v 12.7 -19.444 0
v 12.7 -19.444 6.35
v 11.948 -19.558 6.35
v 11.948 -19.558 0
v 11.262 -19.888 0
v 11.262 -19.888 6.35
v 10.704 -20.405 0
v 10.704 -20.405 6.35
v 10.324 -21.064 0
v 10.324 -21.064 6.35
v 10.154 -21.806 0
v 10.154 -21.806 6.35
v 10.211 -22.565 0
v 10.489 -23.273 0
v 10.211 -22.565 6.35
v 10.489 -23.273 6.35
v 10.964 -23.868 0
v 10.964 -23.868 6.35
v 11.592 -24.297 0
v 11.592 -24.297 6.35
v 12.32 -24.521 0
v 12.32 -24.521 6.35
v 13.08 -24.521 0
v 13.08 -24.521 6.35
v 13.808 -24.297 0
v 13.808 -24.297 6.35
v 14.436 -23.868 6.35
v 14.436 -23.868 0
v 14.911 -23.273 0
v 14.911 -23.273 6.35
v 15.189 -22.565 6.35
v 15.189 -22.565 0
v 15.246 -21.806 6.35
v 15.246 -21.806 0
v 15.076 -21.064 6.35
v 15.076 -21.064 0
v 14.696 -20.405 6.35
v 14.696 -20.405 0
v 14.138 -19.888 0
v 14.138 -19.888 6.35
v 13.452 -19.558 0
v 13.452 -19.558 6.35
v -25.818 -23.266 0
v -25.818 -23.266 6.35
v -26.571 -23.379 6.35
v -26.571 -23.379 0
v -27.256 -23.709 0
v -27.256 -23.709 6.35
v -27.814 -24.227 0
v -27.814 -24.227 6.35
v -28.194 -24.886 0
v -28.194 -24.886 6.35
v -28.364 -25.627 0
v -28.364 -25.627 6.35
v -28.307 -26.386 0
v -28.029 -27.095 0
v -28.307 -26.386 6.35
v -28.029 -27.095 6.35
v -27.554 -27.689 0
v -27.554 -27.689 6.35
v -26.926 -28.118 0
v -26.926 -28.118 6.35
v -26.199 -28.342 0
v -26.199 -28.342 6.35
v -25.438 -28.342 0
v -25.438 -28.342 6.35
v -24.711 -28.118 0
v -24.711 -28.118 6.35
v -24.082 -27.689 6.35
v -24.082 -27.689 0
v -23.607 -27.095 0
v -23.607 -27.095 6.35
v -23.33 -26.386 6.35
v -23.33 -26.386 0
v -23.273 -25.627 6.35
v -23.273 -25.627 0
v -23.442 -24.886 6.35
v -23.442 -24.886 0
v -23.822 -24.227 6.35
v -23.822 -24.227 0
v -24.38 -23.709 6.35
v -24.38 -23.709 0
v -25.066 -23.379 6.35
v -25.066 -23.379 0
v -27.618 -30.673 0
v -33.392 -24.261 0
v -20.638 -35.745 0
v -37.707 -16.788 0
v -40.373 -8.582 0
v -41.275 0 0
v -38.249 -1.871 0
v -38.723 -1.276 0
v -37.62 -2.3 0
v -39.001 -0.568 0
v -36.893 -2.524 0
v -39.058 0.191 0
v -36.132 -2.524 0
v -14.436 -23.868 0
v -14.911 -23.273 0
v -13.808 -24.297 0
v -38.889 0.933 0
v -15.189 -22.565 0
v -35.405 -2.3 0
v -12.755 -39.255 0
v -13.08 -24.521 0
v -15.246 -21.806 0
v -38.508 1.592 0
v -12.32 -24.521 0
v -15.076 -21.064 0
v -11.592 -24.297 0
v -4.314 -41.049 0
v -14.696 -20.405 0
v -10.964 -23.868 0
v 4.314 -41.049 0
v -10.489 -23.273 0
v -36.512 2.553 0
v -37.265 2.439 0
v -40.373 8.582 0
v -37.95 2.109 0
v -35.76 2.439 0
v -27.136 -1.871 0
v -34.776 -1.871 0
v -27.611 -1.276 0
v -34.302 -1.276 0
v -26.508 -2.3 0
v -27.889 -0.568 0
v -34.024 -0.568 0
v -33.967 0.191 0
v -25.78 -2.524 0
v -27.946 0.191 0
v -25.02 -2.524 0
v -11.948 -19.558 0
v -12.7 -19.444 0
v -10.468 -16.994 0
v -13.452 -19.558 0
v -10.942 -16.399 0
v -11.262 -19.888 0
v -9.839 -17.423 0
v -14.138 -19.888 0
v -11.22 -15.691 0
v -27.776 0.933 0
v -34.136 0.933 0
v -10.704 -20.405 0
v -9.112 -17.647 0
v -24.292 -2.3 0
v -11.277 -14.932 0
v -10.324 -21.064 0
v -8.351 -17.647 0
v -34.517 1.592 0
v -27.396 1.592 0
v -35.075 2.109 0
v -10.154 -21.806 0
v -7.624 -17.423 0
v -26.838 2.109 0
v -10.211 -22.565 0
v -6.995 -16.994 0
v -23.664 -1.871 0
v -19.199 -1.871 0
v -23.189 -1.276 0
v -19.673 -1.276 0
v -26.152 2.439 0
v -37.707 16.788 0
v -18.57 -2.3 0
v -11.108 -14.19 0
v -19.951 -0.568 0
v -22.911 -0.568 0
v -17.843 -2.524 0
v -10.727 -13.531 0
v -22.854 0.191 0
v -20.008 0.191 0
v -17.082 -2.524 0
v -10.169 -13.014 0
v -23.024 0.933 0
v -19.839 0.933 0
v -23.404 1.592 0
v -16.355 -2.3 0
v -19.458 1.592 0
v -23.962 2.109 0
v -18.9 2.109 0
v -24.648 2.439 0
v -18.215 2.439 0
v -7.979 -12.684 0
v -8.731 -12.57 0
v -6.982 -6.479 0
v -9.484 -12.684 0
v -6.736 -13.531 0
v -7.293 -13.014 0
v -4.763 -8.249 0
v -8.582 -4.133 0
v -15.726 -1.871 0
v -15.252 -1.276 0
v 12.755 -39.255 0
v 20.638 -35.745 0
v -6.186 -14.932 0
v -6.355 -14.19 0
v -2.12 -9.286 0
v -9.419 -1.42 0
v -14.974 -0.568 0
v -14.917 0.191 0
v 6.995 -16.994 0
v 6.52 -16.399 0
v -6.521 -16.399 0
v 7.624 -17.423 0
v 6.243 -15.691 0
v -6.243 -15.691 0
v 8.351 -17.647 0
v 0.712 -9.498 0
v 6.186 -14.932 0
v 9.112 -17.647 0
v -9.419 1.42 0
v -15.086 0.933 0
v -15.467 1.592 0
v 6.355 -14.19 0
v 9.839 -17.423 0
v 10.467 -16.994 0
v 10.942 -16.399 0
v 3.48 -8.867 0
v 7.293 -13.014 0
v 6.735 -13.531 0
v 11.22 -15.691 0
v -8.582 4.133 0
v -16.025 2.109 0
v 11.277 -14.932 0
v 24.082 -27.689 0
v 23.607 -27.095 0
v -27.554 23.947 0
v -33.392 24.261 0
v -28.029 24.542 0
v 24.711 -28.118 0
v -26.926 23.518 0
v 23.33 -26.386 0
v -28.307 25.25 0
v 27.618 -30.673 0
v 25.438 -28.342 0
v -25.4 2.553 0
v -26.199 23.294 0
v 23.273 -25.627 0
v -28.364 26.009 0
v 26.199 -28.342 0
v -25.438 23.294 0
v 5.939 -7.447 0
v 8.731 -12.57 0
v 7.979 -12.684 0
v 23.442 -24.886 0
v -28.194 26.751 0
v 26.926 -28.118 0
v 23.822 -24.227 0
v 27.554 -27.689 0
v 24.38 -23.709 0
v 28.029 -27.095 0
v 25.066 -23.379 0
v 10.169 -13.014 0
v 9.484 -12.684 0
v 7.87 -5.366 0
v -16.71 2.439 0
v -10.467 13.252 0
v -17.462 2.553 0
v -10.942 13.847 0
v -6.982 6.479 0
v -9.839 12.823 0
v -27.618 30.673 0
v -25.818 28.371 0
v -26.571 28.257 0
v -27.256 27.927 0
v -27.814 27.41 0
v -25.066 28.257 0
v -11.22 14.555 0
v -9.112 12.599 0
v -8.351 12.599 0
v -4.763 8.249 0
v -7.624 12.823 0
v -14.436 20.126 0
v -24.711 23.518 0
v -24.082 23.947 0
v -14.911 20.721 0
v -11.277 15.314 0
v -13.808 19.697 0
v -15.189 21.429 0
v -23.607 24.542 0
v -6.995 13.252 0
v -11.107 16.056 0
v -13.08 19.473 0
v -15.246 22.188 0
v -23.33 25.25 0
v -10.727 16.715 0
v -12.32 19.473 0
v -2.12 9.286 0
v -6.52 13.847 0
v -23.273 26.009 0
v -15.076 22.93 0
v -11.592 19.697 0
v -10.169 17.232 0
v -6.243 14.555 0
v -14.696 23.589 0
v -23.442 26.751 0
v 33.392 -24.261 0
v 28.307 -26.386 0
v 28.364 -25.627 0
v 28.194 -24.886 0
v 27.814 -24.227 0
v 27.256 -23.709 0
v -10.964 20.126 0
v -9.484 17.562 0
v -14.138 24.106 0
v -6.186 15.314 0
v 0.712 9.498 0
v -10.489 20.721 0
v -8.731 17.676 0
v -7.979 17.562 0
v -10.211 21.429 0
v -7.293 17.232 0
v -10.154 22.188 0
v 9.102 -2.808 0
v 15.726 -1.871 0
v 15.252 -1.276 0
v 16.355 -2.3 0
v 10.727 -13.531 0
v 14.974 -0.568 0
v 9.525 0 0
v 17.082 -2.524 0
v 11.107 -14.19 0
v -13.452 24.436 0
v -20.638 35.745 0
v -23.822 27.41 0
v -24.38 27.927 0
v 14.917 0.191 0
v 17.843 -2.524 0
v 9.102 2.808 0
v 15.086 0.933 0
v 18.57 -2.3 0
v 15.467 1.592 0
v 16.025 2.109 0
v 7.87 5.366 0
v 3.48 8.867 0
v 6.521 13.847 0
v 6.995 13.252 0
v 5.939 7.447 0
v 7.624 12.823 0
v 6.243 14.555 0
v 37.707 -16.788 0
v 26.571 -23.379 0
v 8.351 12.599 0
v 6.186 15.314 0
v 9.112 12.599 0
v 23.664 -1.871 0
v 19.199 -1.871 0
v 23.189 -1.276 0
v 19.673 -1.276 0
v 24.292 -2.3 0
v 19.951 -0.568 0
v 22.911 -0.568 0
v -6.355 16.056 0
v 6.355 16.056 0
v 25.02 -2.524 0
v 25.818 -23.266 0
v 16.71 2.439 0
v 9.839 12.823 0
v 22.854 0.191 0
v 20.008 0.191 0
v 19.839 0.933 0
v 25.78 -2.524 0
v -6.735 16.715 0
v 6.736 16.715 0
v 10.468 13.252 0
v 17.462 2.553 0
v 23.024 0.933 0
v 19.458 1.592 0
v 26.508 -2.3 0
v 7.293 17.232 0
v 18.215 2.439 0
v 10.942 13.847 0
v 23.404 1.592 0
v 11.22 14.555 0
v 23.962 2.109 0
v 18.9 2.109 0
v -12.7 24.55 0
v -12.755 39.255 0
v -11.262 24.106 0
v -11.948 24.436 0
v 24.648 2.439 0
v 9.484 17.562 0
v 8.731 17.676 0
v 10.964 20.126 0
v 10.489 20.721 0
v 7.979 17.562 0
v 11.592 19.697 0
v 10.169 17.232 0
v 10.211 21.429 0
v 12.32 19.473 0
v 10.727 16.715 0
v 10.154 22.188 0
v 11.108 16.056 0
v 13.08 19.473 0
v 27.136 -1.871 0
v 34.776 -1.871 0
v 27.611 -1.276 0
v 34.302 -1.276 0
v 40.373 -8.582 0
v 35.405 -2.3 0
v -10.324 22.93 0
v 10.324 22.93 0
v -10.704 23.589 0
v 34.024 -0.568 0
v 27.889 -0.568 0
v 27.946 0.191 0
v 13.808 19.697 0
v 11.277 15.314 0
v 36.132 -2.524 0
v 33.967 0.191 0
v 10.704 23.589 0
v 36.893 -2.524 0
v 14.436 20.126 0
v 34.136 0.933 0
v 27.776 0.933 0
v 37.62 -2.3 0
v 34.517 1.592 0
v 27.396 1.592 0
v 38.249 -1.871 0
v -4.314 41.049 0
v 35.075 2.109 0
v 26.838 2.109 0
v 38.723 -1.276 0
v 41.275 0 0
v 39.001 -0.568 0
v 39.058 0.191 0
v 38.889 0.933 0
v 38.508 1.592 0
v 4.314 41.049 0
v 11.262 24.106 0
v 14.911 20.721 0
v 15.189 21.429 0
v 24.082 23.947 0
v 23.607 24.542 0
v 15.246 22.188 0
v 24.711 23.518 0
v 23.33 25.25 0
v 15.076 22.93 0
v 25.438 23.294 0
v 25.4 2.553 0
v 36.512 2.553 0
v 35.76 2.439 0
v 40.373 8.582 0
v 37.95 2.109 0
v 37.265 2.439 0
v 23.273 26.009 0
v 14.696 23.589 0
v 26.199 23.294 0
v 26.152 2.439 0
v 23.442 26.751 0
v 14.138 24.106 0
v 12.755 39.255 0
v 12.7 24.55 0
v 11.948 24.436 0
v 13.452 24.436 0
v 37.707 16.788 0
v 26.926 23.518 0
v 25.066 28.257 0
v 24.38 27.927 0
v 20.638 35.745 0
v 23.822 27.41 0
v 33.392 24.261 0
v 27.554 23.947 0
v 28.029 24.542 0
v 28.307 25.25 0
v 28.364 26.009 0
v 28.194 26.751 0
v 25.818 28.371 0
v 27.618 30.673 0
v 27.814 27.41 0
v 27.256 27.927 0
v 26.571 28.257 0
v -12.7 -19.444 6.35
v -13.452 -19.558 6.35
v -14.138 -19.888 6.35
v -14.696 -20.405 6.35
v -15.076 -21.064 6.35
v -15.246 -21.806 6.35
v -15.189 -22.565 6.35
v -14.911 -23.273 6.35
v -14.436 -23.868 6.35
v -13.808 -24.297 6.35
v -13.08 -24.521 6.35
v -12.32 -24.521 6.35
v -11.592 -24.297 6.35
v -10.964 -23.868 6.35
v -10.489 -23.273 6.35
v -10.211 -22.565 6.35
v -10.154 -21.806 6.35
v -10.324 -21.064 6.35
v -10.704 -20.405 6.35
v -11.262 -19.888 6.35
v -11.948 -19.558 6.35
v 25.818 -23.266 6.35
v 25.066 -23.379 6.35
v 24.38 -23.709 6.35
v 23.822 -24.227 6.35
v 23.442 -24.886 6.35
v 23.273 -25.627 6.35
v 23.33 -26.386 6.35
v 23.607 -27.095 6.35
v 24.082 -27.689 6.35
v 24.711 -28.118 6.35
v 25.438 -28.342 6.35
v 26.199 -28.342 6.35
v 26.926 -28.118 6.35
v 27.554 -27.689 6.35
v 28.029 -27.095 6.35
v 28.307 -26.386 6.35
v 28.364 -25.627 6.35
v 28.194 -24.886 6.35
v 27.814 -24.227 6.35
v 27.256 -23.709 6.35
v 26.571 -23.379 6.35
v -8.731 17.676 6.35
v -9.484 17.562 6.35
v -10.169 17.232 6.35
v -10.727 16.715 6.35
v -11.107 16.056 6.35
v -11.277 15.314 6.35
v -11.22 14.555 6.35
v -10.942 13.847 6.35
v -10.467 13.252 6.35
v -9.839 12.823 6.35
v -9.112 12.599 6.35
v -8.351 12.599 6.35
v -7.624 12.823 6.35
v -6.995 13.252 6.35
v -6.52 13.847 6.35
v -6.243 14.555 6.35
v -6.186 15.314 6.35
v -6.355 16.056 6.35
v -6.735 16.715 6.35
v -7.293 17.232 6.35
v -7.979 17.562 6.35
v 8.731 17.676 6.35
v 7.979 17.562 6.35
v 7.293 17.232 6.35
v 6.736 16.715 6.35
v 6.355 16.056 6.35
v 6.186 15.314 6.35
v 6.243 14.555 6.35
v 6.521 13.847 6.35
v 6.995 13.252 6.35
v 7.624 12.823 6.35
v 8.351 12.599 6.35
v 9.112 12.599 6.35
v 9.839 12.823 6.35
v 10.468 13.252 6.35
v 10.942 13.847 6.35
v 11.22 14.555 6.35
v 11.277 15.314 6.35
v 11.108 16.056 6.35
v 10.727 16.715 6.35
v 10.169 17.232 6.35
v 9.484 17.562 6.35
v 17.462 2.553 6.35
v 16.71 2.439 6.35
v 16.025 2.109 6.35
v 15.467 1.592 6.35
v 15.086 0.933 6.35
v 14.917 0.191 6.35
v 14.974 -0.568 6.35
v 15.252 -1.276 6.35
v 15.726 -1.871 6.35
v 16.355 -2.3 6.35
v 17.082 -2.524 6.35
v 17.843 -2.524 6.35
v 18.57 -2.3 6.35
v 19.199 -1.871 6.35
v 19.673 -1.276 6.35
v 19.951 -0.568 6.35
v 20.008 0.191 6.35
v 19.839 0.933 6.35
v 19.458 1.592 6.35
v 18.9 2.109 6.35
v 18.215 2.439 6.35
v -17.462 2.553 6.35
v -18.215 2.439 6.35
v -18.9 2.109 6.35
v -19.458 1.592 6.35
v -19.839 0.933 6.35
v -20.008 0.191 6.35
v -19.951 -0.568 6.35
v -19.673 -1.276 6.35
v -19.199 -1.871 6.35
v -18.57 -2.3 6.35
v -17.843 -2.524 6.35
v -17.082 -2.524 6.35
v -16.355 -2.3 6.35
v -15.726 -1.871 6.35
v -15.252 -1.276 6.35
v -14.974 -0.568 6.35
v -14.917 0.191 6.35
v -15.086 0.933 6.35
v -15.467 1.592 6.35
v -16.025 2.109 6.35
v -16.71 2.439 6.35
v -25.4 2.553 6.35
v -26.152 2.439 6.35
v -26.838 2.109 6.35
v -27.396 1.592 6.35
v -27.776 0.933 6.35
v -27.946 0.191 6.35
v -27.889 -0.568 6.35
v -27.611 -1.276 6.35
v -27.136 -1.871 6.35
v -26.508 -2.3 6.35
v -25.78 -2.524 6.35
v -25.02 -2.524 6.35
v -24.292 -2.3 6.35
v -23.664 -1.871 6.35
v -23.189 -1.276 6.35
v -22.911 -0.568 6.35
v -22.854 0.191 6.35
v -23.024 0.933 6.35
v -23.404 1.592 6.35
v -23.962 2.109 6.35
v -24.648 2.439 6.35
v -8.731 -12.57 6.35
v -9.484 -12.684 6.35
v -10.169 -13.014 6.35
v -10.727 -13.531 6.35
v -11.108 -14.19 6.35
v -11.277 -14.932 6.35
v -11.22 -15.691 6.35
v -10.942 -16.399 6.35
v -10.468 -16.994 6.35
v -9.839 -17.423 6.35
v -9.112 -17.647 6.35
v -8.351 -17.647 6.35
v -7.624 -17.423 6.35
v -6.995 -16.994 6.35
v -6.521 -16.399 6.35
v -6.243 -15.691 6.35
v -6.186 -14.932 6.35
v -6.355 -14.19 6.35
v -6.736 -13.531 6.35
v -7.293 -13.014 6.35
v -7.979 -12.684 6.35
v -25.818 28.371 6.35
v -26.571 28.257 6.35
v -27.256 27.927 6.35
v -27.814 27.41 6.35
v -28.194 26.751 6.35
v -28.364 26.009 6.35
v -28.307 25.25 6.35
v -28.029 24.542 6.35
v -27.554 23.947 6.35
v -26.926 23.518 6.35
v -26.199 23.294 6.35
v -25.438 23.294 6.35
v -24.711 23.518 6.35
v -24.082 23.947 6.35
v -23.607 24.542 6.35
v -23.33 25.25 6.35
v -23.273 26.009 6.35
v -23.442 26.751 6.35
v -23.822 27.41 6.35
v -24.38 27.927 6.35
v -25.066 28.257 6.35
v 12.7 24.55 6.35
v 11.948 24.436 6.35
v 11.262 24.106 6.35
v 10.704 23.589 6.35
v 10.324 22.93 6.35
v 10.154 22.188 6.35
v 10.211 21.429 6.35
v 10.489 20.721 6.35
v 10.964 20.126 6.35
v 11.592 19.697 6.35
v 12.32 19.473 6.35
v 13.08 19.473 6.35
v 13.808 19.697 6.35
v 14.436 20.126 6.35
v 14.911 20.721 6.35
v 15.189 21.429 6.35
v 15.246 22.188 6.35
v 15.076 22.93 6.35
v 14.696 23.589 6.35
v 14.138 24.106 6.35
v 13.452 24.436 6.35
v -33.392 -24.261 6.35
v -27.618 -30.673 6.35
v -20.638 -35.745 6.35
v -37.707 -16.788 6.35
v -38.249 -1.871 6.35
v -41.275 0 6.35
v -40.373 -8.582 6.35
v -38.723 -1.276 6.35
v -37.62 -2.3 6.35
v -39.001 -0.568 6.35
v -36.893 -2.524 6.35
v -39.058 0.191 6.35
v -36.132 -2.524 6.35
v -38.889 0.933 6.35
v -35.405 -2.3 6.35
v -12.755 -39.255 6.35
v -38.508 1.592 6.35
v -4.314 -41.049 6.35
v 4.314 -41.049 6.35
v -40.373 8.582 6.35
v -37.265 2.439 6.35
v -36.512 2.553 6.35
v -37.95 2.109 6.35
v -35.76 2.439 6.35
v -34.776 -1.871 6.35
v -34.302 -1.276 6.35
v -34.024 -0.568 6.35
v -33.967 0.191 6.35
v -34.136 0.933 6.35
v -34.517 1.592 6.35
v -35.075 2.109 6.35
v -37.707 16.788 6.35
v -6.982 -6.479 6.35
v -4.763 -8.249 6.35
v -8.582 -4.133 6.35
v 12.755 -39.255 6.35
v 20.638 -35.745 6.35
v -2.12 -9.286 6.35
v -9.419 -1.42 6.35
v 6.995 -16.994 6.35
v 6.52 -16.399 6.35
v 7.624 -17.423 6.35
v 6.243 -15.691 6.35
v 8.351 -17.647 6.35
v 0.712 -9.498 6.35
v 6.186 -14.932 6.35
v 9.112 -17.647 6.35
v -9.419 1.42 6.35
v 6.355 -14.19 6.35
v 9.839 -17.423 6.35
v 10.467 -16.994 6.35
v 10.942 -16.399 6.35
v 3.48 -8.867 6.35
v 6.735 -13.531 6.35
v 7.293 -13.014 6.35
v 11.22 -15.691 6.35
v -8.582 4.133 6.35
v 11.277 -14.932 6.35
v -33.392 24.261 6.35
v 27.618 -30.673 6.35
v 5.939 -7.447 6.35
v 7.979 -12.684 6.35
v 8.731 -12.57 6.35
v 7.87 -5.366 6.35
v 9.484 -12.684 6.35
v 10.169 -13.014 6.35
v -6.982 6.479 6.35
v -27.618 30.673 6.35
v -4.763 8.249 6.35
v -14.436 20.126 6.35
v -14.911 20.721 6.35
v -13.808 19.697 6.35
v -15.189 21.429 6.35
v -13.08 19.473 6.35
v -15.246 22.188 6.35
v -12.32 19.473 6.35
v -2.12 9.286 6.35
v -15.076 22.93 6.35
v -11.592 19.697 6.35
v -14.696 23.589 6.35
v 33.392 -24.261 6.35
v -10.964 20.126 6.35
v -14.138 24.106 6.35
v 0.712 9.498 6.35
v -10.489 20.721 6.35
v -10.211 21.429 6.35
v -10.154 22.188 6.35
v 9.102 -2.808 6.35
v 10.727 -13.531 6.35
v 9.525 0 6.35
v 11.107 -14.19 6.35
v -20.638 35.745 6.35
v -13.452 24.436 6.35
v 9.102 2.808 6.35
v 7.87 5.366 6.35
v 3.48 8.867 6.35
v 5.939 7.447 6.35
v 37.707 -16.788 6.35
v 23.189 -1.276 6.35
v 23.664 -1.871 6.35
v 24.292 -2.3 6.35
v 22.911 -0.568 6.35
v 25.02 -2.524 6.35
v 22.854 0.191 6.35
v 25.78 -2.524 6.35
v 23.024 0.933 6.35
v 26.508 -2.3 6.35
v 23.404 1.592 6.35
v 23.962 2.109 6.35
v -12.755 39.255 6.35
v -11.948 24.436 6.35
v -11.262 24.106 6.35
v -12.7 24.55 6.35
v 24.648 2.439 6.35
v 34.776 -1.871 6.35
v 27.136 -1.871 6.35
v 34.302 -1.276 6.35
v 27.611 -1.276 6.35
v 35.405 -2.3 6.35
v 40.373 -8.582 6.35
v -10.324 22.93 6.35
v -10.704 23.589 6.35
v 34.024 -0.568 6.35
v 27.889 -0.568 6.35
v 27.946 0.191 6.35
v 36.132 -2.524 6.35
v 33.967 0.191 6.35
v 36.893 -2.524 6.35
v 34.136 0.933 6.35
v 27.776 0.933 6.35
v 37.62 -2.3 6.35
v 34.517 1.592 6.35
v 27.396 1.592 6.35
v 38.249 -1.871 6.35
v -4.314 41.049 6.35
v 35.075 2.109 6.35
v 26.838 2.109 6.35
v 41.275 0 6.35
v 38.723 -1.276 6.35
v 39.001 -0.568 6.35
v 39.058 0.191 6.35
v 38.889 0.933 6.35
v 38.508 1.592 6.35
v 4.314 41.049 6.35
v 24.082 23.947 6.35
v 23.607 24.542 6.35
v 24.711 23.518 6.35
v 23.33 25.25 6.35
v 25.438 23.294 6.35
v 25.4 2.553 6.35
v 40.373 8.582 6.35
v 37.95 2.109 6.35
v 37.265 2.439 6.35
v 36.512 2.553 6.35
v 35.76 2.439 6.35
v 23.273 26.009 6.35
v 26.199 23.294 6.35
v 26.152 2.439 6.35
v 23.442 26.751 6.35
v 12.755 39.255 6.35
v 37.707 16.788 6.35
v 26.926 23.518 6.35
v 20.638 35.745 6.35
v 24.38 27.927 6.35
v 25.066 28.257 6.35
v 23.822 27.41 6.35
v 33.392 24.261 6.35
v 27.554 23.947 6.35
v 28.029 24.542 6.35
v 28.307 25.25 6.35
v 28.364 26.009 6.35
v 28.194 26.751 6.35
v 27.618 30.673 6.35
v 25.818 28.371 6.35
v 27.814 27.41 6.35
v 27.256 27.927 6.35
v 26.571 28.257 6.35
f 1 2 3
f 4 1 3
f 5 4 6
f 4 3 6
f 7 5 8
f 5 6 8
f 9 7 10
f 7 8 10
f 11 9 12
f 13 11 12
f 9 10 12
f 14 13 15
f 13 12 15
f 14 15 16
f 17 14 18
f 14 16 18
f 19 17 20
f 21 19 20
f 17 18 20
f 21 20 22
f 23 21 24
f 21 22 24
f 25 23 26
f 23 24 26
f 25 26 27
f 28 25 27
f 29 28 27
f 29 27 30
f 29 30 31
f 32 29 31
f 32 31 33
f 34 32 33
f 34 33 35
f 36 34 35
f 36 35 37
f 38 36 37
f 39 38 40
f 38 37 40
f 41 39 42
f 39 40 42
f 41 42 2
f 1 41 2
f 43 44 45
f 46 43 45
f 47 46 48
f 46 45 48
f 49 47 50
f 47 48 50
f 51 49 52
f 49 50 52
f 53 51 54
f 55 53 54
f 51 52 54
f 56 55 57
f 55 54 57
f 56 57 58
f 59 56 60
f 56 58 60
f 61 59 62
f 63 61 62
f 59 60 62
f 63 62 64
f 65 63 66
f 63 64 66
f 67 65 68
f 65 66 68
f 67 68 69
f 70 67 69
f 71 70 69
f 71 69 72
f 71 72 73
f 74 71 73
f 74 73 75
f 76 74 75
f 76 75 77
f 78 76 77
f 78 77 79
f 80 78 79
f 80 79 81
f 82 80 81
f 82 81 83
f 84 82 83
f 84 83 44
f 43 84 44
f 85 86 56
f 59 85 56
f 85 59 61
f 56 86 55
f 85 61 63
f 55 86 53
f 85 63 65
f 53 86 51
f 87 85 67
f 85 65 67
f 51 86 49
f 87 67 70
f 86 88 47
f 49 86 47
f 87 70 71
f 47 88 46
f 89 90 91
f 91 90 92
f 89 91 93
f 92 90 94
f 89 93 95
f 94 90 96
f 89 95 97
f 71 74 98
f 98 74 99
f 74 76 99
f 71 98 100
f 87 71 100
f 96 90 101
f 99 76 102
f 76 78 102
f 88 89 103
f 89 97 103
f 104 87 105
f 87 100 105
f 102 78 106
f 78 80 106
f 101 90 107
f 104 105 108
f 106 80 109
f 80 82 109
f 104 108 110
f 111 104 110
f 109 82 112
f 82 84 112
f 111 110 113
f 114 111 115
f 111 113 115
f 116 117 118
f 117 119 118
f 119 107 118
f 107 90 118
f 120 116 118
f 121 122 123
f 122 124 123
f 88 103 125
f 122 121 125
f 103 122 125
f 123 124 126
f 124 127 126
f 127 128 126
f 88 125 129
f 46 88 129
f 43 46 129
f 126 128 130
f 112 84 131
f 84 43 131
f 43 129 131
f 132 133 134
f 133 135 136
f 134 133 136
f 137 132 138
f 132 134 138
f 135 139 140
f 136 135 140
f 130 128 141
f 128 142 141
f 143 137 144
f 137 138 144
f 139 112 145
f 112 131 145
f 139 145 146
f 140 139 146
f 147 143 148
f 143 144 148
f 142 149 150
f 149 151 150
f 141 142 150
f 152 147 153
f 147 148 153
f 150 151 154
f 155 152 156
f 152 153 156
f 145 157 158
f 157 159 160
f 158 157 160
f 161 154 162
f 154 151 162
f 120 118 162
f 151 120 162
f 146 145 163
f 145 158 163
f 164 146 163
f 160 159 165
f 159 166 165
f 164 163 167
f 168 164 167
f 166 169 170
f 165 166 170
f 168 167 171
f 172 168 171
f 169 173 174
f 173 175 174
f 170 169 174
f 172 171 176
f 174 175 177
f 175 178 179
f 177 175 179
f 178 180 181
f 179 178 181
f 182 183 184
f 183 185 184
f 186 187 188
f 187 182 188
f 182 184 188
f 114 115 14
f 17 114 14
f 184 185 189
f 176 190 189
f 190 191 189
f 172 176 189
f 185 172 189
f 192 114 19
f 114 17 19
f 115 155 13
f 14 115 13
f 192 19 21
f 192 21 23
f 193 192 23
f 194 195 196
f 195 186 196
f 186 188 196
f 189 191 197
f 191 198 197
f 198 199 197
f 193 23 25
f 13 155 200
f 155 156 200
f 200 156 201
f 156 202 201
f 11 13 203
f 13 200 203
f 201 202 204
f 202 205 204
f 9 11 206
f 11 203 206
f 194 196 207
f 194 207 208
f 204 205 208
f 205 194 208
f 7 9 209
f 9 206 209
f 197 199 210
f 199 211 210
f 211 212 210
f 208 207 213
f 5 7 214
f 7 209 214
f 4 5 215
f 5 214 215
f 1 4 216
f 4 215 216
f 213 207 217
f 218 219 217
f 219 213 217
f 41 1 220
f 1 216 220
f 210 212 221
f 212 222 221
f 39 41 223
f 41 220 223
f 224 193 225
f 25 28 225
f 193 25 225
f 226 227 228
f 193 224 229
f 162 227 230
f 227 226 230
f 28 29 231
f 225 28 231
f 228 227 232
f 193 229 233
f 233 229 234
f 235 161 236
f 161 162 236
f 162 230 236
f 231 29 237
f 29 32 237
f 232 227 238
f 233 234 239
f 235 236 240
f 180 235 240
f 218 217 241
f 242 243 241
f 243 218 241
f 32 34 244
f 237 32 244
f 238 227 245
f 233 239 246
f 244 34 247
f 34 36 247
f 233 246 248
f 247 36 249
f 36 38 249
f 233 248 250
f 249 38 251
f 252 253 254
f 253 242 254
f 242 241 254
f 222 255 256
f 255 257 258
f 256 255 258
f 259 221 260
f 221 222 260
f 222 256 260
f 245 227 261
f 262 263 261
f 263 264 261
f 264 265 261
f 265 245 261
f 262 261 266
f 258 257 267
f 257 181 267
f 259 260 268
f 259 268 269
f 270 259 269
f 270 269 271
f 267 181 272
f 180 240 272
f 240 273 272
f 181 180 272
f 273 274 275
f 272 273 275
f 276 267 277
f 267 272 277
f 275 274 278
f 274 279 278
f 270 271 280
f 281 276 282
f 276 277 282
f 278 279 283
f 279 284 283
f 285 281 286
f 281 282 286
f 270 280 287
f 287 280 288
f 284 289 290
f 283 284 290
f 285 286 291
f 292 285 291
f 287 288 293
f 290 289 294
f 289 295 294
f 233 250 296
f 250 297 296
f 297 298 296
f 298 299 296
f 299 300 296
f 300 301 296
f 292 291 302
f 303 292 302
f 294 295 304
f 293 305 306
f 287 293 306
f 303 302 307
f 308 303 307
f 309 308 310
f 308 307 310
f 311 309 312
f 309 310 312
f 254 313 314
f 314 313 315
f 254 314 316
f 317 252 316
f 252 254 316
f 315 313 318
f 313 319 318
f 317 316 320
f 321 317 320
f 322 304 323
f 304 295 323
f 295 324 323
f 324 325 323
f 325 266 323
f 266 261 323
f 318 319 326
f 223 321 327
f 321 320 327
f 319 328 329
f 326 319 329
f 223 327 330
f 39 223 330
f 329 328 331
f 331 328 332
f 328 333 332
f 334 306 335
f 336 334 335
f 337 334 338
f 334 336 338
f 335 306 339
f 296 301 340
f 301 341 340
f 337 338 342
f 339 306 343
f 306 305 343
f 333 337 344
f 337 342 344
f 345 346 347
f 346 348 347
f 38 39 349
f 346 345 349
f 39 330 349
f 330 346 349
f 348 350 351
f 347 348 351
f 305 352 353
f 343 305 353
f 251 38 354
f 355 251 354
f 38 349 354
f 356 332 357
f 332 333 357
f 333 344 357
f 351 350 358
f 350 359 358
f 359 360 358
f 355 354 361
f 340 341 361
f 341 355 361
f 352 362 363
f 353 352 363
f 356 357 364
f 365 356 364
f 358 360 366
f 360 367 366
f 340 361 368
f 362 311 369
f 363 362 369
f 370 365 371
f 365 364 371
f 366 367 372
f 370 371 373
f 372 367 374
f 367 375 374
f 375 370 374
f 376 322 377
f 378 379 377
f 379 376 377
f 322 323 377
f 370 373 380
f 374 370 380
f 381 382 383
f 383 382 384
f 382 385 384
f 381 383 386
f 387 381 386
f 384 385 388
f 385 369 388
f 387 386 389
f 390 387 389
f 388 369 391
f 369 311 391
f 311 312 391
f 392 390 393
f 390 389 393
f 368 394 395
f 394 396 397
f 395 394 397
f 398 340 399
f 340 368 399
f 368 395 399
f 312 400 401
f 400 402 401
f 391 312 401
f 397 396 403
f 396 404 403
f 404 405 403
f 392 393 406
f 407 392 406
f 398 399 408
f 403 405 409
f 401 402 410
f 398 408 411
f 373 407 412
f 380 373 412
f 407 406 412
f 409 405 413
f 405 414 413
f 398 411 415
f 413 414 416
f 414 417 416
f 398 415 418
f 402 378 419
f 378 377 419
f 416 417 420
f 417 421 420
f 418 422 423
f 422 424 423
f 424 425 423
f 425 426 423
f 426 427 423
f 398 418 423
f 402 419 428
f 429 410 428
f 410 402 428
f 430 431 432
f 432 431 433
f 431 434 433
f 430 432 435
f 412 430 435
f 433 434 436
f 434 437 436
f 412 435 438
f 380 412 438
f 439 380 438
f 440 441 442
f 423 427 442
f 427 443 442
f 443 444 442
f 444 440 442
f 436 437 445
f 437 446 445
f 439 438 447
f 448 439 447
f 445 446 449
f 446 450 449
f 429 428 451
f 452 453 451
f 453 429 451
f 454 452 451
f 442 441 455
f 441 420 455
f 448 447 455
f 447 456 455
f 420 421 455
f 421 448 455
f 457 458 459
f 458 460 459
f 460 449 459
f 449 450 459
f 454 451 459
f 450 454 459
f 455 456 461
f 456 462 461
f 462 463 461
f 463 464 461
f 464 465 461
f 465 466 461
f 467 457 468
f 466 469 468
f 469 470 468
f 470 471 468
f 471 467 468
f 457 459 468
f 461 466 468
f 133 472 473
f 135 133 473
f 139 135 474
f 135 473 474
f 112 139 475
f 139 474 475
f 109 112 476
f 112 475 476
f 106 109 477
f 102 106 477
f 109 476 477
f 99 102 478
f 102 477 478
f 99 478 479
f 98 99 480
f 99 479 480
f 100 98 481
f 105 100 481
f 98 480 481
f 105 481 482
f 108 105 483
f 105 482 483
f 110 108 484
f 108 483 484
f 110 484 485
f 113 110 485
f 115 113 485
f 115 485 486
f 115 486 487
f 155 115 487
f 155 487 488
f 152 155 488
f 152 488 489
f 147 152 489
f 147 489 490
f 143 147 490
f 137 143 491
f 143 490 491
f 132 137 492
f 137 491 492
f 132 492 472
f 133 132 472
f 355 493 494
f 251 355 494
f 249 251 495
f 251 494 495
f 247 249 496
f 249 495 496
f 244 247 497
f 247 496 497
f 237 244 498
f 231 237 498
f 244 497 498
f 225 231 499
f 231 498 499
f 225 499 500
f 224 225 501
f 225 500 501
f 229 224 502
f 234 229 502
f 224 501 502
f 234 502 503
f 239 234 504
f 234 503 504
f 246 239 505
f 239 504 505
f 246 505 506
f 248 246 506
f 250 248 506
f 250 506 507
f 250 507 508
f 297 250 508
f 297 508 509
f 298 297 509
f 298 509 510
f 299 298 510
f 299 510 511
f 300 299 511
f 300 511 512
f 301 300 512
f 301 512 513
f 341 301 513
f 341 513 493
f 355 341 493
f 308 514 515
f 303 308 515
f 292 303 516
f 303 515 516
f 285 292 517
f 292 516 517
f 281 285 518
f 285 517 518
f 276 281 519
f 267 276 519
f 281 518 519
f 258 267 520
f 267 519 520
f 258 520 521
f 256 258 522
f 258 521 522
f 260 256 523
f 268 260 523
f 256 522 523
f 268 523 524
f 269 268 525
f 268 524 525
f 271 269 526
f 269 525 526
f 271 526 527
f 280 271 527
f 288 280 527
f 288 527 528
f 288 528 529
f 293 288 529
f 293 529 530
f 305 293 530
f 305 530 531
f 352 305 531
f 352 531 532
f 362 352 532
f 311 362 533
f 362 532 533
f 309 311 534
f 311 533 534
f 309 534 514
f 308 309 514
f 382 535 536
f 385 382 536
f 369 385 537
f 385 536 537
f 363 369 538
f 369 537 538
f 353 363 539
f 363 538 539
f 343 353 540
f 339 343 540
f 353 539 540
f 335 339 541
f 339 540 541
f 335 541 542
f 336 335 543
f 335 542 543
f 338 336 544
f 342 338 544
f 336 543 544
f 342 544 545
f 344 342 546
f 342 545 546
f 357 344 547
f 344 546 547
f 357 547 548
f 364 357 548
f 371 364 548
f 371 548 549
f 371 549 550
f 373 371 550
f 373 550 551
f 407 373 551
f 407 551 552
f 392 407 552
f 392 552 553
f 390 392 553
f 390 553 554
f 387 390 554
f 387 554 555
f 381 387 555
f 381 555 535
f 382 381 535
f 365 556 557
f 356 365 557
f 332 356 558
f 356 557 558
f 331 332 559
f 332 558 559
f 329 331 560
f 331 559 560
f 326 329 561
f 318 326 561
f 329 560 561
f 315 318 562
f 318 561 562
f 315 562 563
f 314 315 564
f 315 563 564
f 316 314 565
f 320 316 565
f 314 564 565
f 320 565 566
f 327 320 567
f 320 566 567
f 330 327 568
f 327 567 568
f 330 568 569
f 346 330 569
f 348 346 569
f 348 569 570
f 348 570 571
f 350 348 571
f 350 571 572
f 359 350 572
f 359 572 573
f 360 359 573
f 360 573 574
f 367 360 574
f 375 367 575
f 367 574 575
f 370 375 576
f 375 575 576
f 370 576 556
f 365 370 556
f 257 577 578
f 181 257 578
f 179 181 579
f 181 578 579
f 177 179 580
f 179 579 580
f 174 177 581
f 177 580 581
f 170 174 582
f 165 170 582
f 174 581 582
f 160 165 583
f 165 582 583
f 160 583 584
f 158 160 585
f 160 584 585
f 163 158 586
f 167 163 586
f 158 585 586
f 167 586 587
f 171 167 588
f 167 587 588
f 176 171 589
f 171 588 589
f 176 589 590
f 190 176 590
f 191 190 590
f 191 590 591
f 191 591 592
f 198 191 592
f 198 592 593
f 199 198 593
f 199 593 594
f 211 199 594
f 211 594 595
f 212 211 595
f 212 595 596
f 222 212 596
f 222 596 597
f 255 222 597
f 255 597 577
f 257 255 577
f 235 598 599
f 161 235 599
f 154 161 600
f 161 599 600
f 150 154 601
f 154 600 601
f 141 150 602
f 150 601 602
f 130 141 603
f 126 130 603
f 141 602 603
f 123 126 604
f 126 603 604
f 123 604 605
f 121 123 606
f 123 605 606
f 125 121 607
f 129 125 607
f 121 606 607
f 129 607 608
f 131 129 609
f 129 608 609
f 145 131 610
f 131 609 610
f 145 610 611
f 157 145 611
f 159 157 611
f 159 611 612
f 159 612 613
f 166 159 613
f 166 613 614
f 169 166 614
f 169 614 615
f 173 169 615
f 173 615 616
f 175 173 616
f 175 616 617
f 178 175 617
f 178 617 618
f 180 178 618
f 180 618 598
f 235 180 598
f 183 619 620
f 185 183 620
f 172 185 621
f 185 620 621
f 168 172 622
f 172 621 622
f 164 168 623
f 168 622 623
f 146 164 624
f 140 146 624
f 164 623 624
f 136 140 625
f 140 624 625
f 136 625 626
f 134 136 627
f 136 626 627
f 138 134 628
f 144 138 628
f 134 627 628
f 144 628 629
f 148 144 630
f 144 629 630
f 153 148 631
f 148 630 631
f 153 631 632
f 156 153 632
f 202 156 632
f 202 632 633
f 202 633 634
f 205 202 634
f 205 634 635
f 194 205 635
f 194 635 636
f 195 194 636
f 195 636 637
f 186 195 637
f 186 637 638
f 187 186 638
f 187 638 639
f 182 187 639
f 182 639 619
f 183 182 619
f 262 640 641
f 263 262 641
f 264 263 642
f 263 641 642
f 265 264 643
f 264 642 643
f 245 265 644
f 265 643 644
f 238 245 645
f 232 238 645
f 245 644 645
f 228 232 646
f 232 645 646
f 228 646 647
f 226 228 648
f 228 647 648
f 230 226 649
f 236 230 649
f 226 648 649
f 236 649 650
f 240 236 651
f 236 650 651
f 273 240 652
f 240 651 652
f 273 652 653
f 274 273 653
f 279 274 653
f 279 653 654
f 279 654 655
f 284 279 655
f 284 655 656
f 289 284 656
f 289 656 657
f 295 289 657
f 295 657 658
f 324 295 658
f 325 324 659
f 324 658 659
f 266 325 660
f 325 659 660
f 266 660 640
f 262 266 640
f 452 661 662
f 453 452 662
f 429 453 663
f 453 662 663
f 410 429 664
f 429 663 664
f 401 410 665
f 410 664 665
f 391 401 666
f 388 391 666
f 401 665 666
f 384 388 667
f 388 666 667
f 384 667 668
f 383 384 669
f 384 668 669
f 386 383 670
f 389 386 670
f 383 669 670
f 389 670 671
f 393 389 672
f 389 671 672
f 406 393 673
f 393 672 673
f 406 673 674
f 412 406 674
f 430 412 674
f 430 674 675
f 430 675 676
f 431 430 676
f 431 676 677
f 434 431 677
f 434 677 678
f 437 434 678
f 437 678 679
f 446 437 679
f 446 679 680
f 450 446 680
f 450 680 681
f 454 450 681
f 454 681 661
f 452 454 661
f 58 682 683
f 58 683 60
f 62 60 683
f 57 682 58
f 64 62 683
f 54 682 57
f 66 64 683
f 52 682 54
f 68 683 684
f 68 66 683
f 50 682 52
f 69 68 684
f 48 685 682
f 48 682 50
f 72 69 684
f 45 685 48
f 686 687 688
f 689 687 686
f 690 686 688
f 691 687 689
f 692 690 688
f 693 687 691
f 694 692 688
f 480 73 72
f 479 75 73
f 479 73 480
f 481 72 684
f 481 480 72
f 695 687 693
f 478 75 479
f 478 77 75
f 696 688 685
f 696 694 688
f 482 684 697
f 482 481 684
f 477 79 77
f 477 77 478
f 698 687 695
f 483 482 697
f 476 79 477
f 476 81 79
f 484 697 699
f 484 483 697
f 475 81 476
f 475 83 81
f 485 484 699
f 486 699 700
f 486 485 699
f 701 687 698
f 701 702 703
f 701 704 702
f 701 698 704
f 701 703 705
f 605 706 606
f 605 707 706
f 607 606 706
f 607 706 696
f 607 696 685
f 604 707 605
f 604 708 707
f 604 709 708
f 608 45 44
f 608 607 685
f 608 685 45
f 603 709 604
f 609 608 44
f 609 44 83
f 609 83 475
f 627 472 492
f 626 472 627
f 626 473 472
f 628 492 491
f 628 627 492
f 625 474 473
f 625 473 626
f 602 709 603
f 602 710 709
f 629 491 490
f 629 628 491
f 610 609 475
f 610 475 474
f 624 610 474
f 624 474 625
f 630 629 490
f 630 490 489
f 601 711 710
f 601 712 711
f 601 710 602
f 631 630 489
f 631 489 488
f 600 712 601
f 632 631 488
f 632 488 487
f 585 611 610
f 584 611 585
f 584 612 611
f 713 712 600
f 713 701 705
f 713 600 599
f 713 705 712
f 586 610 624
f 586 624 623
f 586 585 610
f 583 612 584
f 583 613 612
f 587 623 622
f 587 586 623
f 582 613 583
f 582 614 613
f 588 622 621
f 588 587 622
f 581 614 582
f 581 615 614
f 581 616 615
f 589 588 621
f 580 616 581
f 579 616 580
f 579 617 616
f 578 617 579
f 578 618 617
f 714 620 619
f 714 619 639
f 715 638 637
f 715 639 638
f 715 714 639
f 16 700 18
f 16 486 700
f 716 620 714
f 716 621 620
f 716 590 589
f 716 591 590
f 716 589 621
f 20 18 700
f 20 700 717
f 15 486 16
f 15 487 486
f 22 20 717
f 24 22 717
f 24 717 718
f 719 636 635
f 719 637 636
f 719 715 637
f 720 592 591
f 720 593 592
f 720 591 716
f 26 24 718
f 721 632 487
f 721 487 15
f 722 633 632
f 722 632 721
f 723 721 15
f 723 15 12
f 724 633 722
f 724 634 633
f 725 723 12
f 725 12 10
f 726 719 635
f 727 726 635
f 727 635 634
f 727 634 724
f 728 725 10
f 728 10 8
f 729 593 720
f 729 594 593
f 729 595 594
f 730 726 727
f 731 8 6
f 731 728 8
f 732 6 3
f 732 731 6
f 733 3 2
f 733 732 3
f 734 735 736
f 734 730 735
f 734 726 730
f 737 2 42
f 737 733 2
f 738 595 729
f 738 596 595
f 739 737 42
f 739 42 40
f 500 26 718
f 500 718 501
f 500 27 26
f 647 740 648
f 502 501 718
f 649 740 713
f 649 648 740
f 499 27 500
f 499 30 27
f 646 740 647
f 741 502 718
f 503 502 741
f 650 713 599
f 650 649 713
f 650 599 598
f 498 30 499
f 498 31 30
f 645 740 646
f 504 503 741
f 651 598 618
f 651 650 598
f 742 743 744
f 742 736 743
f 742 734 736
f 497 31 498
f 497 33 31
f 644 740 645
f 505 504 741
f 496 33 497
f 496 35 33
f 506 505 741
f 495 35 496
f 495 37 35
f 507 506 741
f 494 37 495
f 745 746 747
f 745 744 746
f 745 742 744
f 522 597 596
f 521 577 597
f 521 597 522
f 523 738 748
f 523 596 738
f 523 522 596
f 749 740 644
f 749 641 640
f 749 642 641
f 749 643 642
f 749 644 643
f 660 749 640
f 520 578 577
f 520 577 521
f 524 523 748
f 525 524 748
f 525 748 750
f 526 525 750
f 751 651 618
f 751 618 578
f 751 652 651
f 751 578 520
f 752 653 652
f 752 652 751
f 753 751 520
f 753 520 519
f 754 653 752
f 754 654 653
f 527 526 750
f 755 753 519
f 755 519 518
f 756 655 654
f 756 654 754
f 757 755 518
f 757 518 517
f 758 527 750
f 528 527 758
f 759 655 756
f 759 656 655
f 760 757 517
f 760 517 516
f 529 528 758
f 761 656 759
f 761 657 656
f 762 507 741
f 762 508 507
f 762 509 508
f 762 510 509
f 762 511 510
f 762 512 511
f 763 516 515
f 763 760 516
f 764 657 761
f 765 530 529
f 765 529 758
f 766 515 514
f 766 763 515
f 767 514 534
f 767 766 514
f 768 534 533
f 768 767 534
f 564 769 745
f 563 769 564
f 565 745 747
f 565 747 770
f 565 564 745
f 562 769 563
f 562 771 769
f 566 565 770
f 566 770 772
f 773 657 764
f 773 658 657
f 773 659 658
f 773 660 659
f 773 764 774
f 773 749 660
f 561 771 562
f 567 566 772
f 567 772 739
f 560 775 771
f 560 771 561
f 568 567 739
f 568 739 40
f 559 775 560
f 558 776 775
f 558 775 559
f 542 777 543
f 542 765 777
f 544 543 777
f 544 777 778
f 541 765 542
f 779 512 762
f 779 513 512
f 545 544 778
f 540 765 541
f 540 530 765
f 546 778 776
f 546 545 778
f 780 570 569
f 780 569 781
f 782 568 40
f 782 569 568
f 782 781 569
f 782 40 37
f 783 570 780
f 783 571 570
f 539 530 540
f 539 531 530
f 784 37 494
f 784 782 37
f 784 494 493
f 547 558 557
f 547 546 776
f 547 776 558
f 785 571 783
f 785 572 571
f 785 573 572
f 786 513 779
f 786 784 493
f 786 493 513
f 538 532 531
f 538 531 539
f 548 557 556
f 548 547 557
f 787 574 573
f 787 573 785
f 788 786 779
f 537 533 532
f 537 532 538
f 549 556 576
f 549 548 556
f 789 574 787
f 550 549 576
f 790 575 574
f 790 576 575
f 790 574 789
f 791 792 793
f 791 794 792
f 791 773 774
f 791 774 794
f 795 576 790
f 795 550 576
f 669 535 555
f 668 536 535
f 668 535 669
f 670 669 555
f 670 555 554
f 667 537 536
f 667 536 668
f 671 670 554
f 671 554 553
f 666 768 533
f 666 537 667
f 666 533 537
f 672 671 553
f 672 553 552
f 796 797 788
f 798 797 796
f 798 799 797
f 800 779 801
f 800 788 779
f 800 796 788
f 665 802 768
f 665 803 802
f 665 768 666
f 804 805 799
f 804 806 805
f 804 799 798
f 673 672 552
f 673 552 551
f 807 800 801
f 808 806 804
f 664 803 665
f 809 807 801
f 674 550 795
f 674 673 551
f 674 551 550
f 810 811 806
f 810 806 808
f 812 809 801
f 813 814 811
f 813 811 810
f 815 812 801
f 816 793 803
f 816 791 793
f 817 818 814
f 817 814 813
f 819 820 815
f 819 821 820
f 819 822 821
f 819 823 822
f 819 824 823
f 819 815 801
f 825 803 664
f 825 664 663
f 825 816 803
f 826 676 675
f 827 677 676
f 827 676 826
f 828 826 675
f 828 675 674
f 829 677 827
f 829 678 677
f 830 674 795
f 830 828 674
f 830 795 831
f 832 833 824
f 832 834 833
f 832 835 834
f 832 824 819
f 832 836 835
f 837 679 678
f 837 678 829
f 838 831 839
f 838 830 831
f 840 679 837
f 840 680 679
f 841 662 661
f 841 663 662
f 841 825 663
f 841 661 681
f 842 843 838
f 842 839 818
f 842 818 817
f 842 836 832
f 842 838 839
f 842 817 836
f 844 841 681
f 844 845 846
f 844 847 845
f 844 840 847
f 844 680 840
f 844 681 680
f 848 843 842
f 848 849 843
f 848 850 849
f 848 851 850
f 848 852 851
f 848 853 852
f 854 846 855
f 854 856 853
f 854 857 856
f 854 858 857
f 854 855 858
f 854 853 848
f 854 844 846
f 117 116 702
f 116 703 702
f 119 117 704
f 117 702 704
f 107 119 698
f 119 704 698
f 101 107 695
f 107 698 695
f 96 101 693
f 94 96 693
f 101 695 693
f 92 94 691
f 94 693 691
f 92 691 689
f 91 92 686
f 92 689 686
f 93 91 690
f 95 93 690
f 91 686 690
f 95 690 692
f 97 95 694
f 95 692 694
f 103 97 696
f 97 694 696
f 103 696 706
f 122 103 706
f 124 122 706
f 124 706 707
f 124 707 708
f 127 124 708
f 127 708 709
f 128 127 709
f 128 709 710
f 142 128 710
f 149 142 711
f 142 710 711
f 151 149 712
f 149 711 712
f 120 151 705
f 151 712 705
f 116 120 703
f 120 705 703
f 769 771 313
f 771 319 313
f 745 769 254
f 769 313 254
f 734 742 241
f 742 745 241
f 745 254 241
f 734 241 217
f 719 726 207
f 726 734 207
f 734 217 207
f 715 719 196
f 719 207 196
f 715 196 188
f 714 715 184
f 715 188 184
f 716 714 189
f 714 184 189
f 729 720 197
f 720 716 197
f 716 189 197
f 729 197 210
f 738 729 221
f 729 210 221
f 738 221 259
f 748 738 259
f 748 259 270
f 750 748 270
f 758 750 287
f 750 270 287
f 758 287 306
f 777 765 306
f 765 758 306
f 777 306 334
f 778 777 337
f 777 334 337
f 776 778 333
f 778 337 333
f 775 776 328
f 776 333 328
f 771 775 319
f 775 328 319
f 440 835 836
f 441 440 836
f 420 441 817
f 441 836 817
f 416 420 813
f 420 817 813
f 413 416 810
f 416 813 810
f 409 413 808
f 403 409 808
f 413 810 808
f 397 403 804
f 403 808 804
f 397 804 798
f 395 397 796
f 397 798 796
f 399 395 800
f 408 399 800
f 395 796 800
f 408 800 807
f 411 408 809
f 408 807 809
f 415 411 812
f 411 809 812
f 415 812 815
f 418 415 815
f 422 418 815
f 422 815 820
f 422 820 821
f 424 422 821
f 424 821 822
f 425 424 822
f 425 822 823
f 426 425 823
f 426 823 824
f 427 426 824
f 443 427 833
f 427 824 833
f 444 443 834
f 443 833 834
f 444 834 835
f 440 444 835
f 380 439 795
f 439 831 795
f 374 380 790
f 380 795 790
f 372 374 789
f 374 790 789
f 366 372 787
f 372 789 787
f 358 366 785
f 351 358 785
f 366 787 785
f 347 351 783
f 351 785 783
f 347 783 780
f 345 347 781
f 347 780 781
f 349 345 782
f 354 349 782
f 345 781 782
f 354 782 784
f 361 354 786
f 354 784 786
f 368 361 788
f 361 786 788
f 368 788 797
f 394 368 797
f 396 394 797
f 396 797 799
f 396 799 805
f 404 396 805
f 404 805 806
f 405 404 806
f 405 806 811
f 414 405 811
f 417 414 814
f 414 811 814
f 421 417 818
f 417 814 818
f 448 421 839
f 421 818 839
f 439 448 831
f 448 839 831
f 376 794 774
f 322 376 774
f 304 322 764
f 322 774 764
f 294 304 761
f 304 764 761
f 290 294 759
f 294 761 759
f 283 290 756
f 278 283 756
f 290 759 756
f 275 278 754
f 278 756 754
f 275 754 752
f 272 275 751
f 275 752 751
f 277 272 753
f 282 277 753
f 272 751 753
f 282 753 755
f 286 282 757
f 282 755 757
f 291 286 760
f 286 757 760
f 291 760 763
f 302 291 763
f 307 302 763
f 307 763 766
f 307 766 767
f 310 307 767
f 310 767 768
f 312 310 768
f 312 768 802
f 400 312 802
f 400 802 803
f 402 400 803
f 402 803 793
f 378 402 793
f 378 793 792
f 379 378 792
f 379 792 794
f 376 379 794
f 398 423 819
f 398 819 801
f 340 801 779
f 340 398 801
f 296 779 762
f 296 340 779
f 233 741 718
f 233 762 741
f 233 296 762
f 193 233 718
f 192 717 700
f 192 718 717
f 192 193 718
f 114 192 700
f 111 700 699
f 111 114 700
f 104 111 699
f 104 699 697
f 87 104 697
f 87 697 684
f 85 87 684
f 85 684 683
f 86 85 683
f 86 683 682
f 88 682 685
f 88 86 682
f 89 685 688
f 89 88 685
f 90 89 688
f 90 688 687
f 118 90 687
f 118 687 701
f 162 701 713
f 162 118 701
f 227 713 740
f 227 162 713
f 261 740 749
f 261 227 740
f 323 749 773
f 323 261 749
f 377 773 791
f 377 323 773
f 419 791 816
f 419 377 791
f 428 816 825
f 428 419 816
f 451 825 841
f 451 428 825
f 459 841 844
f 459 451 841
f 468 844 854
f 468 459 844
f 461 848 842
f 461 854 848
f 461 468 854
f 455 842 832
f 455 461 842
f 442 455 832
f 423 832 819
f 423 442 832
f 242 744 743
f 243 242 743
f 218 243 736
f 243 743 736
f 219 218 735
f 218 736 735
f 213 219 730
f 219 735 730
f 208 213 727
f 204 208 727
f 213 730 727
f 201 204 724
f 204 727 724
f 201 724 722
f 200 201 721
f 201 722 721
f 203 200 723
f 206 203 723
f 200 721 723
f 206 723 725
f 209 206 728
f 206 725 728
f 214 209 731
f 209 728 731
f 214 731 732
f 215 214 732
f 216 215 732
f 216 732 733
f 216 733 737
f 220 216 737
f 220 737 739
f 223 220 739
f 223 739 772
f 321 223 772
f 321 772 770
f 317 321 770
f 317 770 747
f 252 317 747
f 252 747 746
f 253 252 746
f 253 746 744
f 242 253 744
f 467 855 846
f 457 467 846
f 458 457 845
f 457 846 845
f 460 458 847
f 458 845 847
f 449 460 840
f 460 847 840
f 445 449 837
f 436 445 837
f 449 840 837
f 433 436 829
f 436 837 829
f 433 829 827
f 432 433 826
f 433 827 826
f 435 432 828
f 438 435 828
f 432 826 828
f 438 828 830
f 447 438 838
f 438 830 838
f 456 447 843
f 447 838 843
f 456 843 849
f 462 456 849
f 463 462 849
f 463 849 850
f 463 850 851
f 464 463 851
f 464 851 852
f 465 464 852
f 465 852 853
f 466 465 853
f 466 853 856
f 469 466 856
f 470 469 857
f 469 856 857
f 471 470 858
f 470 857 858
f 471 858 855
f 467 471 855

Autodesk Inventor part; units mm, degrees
ref_plane "YZ Plane" through (0, 0, 0) normal (1, 0, 0) x (0, 1, 0)
ref_plane "XZ Plane" through (0, 0, 0) normal (0, 1, 0) x (-1, 0, 0)
ref_plane "XY Plane" through (0, 0, 0) normal (0, 0, 1) x (1, 0, 0)
sketch "Sketch1" plane through (0, 0, 0) normal (0, 0, 1) x (1, 0, 0)
  circle A0 centre (0, 0) radius 9.525
  circle A1 centre (0, 0) radius 31.75 construction
  circle A2 centre (-36.5125, 0) radius 4.7625 construction
  circle A3 centre (36.5125, 0) radius 4.7625 construction
  circle A4 centre (0, 0) radius 17.4625 construction
  line L0 (-36.5125, 0) -> (36.5125, 0) construction
  circle A5 centre (0, 0) radius 25.4 construction
  circle A6 centre (0, 0) radius 36.5125 construction
  line L1 (0, 36.5125) -> (0, 0) construction
  line L2 (-25.8182, 25.8182) -> (0, 0) construction
  circle A7 centre (-25.8182, 25.8182) radius 4.7625 construction
  circle A8 centre (-25.8182, -25.8182) radius 4.7625 construction
  circle A9 centre (25.8182, -25.8182) radius 4.7625 construction
  circle A10 centre (25.8182, 25.8182) radius 4.7625 construction
  circle A11 centre (0, 0) radius 41.275
  point P0 (-17.4625, 0)
  point P1 (-25.4, 0)
  point P2 (-12.7, -21.997)
  point P3 (-8.7313, -15.123)
  point P4 (12.7, -21.997)
  point P5 (8.7312, -15.123)
  point P6 (25.4, 0)
  point P7 (17.4625, 0)
  point P8 (12.7, 21.997)
  point P9 (8.7313, 15.123)
  point P10 (-12.7, 21.997)
  point P11 (-8.7312, 15.123)
  dimension "d3" = 34.925
  dimension "d18" = 50.8
  dimension "d0" = 19.05
  dimension "d1" = 63.5
  dimension "d2" = 9.525
  dimension "d21" = 360
  dimension "d30" = 45
  dimension "d33" = 360
  dimension "d37" = 360
extrude "Extrusion1" add sketch "Sketch1" along normal blind 6.35
hole "Hole2" at (-17.4625, 0, 0) at (-36.5125, 0, 0) at (36.5125, 0, 0) at (-25.4, 0, 0) at (-12.7, -21.997, 0) at (-8.7313, -15.123, 0) at (12.7, -21.997, 0) at (8.7312, -15.123, 0) at (25.4, 0, 0) at (17.4625, 0, 0) at (12.7, 21.997, 0) at (8.7313, 15.123, 0) at (-12.7, 21.997, 0) at (-8.7312, 15.123, 0) at (-25.8182, 25.8182, 0) at (25.8182, 25.8182, 0) at (25.8182, -25.8182, 0) at (-25.8182, -25.8182, 0) direction (0, 0, 1) diameter 5.1054 end through all clearance for "Flat Head Machine Screw (82)" size "#10" standard "Ansi Unified Screw Threads"
properties part number "GP9-003" material "Polycarbonate, Smoke"
